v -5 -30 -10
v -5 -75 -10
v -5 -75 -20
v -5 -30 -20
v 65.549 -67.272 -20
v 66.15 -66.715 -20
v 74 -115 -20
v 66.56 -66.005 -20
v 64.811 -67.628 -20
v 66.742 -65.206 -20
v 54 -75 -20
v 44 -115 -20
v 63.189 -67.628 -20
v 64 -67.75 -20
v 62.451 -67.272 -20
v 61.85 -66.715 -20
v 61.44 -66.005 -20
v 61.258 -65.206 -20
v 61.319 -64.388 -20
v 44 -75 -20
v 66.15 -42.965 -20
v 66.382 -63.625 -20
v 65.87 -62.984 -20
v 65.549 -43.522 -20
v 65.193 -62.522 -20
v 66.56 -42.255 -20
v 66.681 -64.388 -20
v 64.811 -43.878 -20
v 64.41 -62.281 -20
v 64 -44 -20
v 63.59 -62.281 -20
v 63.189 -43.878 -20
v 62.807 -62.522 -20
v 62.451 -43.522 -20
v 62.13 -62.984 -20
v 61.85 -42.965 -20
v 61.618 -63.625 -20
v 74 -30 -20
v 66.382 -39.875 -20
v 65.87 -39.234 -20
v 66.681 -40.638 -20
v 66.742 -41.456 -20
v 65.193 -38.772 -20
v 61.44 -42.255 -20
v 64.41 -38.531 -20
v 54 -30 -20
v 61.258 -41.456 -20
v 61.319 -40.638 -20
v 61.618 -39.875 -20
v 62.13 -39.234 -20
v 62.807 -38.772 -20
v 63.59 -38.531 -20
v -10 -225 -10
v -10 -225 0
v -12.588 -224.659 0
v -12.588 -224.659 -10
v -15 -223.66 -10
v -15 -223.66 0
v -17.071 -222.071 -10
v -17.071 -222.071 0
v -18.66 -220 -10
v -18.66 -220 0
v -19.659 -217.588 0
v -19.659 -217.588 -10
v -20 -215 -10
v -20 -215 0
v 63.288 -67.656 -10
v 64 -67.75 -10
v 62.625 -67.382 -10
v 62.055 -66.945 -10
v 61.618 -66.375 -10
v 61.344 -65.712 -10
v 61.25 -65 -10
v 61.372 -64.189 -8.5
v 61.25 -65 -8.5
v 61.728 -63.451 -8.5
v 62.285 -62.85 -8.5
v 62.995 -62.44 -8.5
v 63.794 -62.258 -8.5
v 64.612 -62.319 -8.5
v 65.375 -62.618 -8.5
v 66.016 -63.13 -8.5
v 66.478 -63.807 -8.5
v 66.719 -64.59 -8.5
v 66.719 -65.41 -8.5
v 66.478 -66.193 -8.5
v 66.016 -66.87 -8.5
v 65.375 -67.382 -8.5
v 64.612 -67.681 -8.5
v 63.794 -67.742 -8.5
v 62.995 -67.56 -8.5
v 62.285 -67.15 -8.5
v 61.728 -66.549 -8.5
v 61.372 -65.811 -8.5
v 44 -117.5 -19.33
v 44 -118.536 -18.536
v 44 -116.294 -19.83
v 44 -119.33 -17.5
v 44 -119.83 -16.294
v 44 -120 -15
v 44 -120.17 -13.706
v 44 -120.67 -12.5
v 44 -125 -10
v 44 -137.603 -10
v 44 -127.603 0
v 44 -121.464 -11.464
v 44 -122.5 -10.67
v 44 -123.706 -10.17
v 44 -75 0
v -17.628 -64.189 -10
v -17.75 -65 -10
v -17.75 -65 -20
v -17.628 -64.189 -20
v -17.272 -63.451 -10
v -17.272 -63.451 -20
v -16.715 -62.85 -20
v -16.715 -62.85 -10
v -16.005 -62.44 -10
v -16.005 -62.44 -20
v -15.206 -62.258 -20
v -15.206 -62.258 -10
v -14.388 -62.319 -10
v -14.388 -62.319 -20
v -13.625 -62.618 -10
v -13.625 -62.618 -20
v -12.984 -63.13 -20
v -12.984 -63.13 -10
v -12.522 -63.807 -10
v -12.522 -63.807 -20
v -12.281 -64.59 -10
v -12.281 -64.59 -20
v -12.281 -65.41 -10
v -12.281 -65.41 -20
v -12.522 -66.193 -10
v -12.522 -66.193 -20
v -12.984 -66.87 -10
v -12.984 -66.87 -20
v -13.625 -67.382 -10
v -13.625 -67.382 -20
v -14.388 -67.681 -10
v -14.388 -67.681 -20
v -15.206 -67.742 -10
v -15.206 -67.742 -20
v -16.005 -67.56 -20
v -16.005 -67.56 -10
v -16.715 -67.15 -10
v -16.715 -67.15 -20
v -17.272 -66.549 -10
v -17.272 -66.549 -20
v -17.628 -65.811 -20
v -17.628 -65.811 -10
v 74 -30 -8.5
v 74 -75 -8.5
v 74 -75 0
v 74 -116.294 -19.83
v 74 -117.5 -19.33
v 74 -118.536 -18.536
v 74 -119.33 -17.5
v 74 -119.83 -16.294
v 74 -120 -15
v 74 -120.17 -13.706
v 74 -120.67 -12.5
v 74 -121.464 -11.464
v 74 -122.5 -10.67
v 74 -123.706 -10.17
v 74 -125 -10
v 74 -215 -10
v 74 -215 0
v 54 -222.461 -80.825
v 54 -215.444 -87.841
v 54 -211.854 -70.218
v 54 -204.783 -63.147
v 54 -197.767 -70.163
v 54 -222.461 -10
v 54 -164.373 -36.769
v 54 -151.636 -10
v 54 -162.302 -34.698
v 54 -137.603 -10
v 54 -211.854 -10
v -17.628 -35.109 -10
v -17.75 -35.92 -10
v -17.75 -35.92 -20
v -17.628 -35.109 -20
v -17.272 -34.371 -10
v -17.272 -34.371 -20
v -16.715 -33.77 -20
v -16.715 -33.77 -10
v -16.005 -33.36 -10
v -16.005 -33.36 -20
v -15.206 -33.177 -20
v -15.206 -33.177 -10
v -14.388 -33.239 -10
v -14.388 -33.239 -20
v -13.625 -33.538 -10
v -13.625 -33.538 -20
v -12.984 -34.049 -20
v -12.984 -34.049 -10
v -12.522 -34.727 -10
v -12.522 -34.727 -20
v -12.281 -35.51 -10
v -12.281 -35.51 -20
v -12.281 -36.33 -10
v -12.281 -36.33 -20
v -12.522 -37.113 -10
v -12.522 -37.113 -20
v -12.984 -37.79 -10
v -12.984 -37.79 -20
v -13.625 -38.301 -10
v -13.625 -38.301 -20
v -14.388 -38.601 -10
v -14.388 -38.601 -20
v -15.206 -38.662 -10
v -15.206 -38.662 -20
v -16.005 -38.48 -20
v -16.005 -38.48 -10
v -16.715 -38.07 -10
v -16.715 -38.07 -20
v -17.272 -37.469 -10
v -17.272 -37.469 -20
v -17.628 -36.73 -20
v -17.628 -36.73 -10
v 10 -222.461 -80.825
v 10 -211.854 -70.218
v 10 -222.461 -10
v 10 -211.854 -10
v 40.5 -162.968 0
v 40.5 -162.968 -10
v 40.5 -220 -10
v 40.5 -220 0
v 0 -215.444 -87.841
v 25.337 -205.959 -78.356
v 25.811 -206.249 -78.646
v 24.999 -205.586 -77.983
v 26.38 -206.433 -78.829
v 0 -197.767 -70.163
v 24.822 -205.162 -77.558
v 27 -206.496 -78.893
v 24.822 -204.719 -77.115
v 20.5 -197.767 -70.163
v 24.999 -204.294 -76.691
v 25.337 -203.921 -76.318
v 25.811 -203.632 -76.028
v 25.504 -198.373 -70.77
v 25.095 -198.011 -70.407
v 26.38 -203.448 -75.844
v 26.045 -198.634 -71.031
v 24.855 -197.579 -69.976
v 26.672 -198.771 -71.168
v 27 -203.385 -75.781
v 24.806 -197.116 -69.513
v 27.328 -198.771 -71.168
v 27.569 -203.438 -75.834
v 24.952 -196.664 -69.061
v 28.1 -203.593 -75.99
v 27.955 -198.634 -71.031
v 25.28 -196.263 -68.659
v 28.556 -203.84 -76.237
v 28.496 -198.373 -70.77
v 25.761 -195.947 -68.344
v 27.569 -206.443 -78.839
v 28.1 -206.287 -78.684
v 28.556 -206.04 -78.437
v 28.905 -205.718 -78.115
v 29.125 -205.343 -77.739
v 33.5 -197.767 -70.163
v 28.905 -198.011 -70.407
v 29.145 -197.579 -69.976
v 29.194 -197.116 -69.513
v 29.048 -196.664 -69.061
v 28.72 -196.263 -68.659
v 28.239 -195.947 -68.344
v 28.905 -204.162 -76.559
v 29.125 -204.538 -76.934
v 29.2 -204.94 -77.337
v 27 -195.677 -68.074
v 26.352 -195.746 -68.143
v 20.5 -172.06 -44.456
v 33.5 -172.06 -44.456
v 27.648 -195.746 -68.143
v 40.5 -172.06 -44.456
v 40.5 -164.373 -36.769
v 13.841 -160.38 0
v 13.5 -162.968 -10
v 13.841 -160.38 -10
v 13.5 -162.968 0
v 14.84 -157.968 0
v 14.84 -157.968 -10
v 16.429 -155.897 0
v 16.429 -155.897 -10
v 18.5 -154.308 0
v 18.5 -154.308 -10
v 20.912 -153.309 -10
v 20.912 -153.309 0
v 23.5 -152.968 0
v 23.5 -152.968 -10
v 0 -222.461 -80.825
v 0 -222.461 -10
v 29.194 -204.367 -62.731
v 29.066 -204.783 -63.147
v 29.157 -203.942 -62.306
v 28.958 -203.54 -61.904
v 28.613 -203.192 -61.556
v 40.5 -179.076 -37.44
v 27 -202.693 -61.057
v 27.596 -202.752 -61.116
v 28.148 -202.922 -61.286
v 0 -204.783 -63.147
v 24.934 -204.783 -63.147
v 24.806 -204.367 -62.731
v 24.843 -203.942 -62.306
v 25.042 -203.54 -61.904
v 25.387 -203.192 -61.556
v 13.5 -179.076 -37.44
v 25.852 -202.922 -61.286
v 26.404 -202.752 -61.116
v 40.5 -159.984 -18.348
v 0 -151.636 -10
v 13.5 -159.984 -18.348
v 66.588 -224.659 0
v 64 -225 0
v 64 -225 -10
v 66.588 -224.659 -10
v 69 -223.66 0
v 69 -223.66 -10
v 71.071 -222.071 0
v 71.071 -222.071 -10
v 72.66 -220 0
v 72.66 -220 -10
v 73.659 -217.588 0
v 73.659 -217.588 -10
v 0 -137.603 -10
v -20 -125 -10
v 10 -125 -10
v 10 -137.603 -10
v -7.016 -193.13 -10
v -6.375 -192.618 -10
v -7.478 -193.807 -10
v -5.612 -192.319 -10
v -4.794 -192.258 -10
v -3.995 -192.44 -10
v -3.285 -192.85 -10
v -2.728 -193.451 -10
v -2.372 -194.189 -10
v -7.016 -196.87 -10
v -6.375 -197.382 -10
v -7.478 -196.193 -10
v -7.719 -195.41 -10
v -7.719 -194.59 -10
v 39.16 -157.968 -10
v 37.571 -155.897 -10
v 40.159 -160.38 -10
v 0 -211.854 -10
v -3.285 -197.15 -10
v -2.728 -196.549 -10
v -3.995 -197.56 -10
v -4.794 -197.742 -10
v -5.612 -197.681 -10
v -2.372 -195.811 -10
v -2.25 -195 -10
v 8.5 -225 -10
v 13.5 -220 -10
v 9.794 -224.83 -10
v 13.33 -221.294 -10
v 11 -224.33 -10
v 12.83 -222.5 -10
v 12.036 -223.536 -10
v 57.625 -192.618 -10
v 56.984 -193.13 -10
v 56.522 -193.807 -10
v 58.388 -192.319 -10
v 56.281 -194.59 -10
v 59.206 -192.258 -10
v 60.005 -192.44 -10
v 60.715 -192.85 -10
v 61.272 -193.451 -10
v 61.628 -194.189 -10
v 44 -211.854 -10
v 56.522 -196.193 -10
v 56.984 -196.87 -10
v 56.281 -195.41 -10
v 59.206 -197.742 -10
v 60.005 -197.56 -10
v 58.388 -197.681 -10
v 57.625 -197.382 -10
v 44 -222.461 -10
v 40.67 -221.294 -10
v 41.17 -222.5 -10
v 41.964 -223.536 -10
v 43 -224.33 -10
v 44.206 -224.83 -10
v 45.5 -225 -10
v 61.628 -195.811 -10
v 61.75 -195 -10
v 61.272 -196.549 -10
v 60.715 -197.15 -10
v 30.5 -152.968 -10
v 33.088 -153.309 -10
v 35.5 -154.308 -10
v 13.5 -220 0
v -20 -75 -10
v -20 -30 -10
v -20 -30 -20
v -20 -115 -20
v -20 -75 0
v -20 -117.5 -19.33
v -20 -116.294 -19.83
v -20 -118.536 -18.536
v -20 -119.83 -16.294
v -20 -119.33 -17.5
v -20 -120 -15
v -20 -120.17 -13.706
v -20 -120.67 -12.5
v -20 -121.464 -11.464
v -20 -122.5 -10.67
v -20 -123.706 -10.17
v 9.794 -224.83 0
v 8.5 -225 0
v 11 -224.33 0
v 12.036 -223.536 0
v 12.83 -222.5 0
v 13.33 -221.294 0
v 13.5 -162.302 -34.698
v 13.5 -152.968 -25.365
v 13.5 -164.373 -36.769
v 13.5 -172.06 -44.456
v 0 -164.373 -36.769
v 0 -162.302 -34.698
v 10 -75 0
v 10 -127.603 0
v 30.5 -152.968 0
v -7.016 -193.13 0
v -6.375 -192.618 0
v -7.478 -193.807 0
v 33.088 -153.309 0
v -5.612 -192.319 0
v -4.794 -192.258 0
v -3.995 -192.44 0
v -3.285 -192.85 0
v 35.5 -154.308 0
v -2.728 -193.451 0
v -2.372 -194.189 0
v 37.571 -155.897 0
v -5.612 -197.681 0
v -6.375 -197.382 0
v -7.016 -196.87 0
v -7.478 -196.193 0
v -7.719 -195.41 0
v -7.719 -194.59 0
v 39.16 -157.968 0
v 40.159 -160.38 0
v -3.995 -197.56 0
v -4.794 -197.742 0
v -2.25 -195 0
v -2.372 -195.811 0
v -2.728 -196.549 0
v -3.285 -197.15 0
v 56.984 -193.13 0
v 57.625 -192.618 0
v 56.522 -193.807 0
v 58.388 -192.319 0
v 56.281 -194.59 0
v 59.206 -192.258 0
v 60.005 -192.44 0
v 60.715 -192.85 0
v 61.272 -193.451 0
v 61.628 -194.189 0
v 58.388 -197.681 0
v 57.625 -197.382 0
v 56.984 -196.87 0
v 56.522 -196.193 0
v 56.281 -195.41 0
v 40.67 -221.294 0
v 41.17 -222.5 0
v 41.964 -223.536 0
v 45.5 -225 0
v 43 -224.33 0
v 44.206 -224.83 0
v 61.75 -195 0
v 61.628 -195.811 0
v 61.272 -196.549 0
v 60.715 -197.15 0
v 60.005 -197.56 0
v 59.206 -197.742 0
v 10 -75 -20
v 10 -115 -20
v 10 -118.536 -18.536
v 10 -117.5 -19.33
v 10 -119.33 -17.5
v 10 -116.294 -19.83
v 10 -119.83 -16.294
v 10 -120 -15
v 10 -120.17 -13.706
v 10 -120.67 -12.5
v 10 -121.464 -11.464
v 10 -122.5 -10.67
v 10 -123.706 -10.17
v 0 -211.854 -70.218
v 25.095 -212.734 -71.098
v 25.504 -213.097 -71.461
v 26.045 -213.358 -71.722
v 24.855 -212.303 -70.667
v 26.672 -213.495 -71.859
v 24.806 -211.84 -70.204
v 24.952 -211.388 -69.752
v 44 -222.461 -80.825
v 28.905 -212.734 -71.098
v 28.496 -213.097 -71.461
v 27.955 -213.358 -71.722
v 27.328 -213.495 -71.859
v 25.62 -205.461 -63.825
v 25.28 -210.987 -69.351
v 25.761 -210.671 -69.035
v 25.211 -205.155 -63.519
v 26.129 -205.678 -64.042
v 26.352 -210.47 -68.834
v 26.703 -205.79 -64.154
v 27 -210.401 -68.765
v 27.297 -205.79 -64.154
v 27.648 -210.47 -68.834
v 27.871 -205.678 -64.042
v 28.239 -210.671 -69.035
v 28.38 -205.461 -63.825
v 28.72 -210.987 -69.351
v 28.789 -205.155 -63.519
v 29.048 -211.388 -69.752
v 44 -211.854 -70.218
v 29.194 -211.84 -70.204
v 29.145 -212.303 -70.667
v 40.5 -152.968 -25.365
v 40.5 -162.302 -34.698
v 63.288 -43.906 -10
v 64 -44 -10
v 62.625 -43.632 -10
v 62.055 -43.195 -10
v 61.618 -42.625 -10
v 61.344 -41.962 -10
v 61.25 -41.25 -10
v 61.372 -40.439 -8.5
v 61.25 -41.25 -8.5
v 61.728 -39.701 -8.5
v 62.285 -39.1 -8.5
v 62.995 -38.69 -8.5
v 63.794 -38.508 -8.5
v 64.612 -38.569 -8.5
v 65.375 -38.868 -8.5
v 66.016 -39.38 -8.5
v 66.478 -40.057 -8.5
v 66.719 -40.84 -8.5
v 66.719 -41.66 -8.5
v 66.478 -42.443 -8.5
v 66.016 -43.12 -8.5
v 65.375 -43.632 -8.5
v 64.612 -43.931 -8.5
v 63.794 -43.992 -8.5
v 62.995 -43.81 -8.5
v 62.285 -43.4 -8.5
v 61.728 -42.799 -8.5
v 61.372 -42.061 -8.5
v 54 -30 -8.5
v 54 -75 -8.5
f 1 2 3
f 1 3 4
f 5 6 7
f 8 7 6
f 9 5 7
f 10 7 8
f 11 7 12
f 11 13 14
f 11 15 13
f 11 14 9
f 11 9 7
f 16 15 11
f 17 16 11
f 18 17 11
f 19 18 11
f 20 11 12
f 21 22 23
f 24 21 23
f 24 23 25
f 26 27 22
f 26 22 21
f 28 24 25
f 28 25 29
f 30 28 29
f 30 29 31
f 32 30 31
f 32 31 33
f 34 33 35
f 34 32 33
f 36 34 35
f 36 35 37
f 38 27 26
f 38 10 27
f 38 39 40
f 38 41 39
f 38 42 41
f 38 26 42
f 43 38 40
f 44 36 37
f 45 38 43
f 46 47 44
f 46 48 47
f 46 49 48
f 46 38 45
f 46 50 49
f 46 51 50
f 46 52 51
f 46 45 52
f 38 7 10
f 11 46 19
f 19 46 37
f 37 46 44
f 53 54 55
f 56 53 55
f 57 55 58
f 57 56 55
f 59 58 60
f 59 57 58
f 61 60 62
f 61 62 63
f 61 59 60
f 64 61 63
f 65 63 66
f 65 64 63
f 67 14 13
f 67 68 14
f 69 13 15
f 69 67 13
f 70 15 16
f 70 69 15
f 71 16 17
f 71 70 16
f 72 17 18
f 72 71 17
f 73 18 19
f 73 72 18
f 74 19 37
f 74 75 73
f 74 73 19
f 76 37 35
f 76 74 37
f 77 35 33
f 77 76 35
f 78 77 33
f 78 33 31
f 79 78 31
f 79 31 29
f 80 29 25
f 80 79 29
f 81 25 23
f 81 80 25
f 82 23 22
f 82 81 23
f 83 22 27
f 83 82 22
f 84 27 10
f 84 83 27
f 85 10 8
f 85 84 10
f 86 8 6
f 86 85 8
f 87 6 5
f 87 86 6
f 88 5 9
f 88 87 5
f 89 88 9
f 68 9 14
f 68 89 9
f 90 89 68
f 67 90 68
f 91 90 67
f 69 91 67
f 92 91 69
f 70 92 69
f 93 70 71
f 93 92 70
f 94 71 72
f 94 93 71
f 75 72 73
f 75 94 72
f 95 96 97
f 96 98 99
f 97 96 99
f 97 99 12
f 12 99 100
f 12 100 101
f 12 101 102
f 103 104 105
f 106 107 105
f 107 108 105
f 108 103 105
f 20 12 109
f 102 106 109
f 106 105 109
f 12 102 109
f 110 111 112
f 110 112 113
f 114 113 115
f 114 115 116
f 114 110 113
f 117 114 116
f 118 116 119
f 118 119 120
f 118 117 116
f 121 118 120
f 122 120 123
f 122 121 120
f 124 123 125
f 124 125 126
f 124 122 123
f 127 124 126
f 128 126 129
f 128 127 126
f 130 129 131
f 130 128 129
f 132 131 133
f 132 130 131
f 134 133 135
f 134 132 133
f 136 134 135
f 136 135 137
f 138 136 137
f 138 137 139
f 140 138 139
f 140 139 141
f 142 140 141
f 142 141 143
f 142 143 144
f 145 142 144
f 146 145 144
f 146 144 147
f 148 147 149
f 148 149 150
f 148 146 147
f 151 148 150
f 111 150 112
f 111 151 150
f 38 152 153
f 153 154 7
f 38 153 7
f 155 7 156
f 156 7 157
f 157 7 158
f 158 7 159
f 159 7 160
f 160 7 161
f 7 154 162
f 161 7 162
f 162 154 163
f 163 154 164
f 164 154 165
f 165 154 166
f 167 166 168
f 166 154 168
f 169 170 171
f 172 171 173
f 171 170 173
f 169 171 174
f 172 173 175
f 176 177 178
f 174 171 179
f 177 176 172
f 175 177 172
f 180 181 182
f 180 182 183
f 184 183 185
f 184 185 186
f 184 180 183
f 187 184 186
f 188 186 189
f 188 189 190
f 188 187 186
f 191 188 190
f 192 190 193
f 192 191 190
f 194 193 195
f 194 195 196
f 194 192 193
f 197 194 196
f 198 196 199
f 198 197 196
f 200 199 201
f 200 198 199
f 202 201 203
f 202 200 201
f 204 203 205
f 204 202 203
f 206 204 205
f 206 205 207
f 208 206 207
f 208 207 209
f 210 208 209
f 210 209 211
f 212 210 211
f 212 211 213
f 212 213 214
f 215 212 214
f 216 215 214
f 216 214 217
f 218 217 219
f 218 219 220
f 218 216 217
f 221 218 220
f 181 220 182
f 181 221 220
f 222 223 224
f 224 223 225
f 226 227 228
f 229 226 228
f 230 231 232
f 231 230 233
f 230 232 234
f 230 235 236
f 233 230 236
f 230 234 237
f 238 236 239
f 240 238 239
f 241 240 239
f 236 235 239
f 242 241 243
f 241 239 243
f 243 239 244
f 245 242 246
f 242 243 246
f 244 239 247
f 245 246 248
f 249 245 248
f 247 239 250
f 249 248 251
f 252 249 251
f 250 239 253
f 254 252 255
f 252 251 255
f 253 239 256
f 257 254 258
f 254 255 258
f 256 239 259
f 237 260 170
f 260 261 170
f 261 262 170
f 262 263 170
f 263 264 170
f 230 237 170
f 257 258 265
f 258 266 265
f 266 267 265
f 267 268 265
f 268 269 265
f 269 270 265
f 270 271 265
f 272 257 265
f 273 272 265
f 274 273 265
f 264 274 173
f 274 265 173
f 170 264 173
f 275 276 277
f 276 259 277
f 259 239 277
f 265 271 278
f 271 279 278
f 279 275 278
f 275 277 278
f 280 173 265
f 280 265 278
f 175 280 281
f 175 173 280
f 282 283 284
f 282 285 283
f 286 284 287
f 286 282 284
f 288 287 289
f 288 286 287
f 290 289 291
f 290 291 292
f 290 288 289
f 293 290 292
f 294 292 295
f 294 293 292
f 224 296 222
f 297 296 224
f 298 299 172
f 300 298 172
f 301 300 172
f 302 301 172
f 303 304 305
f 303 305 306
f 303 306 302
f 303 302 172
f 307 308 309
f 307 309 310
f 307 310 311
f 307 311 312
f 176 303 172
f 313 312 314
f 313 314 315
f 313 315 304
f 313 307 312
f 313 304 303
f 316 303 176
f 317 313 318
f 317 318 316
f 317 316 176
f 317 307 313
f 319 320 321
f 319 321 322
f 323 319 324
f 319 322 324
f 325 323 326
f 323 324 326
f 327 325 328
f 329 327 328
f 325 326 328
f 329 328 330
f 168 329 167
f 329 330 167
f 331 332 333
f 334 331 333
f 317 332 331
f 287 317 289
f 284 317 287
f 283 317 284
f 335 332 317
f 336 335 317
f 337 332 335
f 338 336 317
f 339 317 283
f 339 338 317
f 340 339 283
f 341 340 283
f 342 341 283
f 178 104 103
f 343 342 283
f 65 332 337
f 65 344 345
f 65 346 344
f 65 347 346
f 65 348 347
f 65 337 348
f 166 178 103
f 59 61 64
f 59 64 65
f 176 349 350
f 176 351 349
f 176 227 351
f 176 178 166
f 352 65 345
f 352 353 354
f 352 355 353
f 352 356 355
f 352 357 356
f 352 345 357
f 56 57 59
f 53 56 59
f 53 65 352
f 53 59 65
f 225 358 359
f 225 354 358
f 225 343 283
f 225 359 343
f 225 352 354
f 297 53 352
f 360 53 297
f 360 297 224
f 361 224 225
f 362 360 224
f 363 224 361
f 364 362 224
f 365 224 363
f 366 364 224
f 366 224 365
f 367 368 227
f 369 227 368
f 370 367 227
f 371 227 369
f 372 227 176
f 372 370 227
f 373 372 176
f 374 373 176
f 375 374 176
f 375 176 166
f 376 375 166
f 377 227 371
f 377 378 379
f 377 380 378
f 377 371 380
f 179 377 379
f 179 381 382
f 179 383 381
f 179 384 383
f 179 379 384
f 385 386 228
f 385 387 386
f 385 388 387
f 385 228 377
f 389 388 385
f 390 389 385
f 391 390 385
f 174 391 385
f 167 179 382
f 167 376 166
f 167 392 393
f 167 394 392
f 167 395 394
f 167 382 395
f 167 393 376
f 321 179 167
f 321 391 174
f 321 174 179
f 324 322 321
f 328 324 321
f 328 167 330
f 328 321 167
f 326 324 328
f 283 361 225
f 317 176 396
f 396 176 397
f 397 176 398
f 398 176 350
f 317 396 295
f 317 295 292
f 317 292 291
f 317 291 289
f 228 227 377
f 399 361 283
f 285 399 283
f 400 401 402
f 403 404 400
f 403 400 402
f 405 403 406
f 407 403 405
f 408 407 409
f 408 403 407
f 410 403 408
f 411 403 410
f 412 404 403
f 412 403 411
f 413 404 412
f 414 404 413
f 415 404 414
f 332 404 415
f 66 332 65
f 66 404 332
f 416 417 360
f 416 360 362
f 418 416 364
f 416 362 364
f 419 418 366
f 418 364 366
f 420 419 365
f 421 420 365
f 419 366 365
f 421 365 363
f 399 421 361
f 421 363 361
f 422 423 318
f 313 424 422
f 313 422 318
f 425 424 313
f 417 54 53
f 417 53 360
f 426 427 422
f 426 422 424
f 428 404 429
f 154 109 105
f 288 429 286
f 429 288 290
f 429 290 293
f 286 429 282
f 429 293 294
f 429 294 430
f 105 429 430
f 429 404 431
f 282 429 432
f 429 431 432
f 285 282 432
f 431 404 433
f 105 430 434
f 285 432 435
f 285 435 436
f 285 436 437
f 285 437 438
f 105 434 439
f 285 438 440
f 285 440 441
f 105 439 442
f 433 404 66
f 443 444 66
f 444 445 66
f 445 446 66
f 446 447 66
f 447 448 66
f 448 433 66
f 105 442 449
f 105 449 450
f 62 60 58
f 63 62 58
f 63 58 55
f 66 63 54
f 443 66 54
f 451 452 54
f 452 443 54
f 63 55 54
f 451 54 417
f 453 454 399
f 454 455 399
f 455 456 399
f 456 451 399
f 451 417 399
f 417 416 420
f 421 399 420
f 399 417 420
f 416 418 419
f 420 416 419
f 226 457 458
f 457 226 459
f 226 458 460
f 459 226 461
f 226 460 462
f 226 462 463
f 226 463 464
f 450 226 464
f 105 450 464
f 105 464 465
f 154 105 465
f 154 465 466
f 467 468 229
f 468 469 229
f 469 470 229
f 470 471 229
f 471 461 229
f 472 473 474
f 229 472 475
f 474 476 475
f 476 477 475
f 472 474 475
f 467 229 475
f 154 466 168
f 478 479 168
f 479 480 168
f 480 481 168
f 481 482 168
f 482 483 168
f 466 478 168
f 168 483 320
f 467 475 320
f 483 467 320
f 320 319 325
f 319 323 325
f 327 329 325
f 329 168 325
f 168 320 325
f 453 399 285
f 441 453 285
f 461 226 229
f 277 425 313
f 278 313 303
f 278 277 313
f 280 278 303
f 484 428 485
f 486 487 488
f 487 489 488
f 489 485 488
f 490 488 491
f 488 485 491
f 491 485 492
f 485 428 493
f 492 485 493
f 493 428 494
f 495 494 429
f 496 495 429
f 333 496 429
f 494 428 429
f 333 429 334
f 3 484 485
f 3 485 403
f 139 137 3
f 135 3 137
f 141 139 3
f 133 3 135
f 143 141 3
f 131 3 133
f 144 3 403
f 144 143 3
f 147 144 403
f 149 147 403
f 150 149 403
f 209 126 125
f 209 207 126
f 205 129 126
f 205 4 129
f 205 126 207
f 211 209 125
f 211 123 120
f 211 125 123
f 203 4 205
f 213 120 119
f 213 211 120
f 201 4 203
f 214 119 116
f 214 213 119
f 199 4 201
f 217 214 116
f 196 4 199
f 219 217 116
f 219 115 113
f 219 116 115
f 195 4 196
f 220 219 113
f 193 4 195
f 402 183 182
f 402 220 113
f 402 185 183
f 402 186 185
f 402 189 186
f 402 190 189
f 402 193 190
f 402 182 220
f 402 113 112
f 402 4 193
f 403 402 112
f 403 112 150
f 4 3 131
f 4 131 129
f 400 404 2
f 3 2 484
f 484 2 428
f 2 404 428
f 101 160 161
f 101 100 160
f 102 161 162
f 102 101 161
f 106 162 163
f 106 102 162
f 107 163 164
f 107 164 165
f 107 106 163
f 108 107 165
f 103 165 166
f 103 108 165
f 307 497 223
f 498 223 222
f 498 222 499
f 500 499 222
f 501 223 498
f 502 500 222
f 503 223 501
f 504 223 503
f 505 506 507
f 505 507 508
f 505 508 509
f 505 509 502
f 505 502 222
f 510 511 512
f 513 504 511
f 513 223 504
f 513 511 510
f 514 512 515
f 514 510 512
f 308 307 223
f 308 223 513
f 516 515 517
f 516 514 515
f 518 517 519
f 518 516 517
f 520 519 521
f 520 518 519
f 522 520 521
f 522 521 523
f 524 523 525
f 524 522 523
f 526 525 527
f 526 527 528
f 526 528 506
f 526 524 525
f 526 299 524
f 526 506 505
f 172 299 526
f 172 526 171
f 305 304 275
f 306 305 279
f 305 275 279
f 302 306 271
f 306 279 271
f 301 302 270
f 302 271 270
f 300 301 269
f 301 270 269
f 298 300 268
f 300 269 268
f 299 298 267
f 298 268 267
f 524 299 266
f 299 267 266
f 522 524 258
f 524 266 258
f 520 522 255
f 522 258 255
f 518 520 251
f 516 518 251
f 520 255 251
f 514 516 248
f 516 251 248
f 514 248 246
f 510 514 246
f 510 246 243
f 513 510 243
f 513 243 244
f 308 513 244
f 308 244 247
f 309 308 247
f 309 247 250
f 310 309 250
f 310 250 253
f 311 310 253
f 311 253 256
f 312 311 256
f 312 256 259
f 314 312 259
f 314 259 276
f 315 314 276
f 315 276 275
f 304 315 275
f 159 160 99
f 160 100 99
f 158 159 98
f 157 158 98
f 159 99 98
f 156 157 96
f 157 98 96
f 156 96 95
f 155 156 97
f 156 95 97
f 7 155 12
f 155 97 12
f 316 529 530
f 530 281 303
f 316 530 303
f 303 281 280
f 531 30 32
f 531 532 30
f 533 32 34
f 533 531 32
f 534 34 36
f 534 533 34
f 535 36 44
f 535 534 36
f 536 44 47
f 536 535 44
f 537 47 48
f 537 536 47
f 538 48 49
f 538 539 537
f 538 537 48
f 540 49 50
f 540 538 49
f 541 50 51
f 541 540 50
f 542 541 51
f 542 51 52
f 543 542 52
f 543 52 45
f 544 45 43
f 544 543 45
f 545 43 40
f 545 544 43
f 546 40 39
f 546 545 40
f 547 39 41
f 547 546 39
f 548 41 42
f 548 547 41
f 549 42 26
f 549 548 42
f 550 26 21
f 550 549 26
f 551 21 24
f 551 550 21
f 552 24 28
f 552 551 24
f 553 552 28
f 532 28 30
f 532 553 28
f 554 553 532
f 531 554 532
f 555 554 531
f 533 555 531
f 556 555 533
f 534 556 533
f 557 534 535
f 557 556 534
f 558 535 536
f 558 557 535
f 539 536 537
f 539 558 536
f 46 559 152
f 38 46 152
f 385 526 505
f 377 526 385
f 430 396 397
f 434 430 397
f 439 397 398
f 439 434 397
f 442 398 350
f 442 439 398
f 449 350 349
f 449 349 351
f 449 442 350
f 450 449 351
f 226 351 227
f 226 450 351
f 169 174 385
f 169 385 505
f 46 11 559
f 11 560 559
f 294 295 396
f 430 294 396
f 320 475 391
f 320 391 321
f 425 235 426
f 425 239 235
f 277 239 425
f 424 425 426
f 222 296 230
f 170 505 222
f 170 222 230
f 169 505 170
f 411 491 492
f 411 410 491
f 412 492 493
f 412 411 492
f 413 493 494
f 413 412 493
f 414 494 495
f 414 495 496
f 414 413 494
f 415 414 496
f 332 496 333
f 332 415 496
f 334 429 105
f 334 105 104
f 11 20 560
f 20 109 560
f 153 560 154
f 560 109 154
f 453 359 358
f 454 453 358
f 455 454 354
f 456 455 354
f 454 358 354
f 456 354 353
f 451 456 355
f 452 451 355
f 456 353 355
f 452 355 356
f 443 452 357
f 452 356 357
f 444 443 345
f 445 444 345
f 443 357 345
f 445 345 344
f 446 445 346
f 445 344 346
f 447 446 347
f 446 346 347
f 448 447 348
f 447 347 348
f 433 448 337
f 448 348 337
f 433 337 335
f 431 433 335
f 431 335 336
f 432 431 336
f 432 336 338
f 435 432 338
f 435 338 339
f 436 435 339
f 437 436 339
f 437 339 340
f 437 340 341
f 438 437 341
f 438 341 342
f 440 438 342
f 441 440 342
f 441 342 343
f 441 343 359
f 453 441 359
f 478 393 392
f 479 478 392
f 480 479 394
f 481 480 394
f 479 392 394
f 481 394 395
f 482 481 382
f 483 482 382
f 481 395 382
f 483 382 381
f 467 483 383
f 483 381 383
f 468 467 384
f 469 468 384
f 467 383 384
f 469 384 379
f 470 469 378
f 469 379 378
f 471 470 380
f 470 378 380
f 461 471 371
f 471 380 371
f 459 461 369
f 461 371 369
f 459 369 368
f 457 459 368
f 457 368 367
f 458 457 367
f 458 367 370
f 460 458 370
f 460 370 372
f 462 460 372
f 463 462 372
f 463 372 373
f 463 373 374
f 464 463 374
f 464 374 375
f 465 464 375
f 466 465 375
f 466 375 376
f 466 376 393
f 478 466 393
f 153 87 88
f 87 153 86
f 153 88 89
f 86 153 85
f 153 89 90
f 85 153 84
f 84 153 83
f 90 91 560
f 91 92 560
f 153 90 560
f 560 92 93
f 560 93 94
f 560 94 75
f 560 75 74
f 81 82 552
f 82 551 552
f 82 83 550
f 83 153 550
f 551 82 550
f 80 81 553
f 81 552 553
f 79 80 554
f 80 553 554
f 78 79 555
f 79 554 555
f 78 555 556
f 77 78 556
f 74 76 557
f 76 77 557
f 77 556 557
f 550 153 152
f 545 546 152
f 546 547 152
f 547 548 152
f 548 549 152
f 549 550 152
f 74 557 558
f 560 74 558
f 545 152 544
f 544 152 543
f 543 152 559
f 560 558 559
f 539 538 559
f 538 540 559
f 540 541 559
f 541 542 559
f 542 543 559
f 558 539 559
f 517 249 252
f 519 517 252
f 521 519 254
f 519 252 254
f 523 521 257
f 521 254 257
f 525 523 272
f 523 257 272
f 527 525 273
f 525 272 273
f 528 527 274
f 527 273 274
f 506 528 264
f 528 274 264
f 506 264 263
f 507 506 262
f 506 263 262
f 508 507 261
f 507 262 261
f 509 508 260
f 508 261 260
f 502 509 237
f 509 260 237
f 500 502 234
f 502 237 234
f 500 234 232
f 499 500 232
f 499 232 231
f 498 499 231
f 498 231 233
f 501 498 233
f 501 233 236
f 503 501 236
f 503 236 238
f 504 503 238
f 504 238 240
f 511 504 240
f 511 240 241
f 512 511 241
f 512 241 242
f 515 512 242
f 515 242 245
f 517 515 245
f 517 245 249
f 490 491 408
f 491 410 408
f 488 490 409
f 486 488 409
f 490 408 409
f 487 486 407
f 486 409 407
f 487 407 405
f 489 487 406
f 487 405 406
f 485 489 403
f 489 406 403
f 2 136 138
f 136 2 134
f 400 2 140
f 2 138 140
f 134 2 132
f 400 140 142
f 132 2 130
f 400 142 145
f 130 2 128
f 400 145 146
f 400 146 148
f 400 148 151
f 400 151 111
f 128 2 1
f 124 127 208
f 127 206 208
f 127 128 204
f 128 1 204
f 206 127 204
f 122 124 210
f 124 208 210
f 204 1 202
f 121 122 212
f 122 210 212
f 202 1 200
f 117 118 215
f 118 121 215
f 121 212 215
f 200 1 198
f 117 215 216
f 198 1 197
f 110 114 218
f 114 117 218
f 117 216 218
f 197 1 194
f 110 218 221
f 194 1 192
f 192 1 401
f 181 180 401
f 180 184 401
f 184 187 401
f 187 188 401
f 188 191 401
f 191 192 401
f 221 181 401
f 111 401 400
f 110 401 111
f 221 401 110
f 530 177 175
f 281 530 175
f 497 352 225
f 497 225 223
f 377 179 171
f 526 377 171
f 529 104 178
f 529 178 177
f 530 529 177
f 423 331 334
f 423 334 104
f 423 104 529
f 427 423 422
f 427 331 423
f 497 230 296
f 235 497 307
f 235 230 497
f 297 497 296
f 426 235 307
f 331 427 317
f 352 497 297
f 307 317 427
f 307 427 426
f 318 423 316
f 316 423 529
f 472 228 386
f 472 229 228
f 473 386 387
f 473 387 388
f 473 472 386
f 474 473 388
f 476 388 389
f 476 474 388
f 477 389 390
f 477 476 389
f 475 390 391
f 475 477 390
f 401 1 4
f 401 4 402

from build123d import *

# Parameters (mm, degrees)
SKETCH2_W               = 34
SKETCH2_H               = 20
SKETCH2_W_2             = 30
SKETCH2_H_2             = 150
BOSS_EXTRUDE1_DEPTH     = 10
SKETCH3_W               = 20
SKETCH3_H               = 45
SKETCH3_R               = 2.75
BOSS_EXTRUDE2_DEPTH     = 1.5
SKETCH4_W               = 15
SKETCH4_H               = 45
SKETCH4_R               = 2.75
BOSS_EXTRUDE3_DEPTH     = 10
SKETCH5_R               = 2.75
BOSS_EXTRUDE4_DEPTH     = 10
FILLET1_R               = 5
SKETCH6_W               = 34
SKETCH6_H               = 10
BOSS_EXTRUDE5_DEPTH     = 70
BOSS_EXTRUDE6_REACH     = 246.665
CUT_EXTRUDE1_DEPTH      = 34
FILLET2_R               = 5
CUT_EXTRUDE2_START      = -20
CUT_EXTRUDE2_DEPTH      = 20
CUT_EXTRUDE3_DEPTH      = 20
BOSS_EXTRUDE7_DEPTH     = 54
CUT_EXTRUDE4_DEPTH      = 240.922546822
CUT_EXTRUDE4_DEPTH_BACK = 240.922546822
CUT_EXTRUDE5_DEPTH      = 240.922546822
CUT_EXTRUDE5_DEPTH_BACK = 240.922546822
BOSS_EXTRUDE8_DEPTH     = 54
CUT_EXTRUDE6_DEPTH      = 248.030112784
CUT_EXTRUDE6_DEPTH_BACK = 248.030112784
SKETCH18_R              = 2.2
CUT_EXTRUDE7_DEPTH      = 9.92254106
SKETCH20_W              = 54
SKETCH20_H              = 9.922541059
BOSS_EXTRUDE9_DEPTH     = 25
SKETCH21_R              = 2.2
CUT_EXTRUDE8_DEPTH      = 25
BOSS_EXTRUDE10_START    = 13
SKETCH22_R              = 2.2
BOSS_EXTRUDE10_DEPTH    = 13
SKETCH23_W              = 13
SKETCH23_H              = 77.7
CUT_EXTRUDE10_DEPTH     = 13
SKETCH24_W              = 27
SKETCH24_H              = 27
CUT_EXTRUDE11_DEPTH     = 10
CUT_EXTRUDE12_DEPTH     = 10
BOSS_EXTRUDE11_DEPTH    = 10
BOSS_EXTRUDE12_DEPTH    = 10
FILLET3_R               = 10
FILLET4_R               = 5
FILLET5_R               = 10
CUT_EXTRUDE14_DEPTH     = 250.319480135


with BuildPart() as part:
    # Sketch2 → Boss-Extrude1 (new body)
    with BuildSketch(Plane.XY):
        Polygon((10, -225), (10, -205), (10, -75), (-20, -75), (-20, -225), align=None)
        with Locations((27, -215)):
            Rectangle(SKETCH2_W, SKETCH2_H)
        with Locations((59, -150)):
            Rectangle(SKETCH2_W_2, SKETCH2_H_2)
    extrude(amount=-BOSS_EXTRUDE1_DEPTH)

    # Sketch3 → Boss-Extrude2 (add)
    with BuildSketch(Plane(origin=(0, 0, -8.5), x_dir=(-1, 0, 0), z_dir=(0, 0, -1))):
        with Locations((-64, -52.5)):
            Rectangle(SKETCH3_W, SKETCH3_H)
        with Locations((-64, -65)):
            Circle(SKETCH3_R, mode=Mode.SUBTRACT)
        with Locations((-64, -41.25)):
            Circle(SKETCH3_R, mode=Mode.SUBTRACT)
    extrude(amount=BOSS_EXTRUDE2_DEPTH)

    # Sketch4 → Boss-Extrude3 (add)
    # profile 1 of 2: a face of its own
    with BuildSketch(Plane(origin=(0, 0, -10), x_dir=(-1, 0, 0), z_dir=(0, 0, -1))):
        Polygon((20, -75), (5, -75), (-10, -75), (-10, -120), (20, -120), align=None)
    # profile 2 of 2: a face of its own
    with BuildSketch(Plane(origin=(0, 0, -10), x_dir=(-1, 0, 0), z_dir=(0, 0, -1))):
        with Locations((12.5, -52.5)):
            Rectangle(SKETCH4_W, SKETCH4_H)
        with Locations((15, -65)):
            Circle(SKETCH4_R, mode=Mode.SUBTRACT)
        with Locations((15, -35.919713403)):
            Circle(SKETCH4_R, mode=Mode.SUBTRACT)
    extrude(amount=BOSS_EXTRUDE3_DEPTH)

    # Sketch5 → Boss-Extrude4 (add)
    with BuildSketch(Plane(origin=(0, 0, -10), x_dir=(-1, 0, 0), z_dir=(0, 0, -1))):
        Polygon((-74, -120), (-44, -120), (-44, -75), (-54, -75), (-54, -30), (-74, -30), align=None)
        with Locations(Location((-64, -65, 0), (0, 0, 270))):
            Circle(SKETCH5_R, mode=Mode.SUBTRACT)
        with Locations(Location((-64, -41.25, 0), (0, 0, 270))):
            Circle(SKETCH5_R, mode=Mode.SUBTRACT)
    extrude(amount=BOSS_EXTRUDE4_DEPTH)

    # Fillet1
    fillet1_edges = [part.edges().sort_by_distance(p)[0] for p in [
        (59, -120, -10),
        (-5, -120, -10),
    ]]
    fillet(fillet1_edges, radius=FILLET1_R)
    fillet1_2_edges = [part.edges().sort_by_distance(p)[0] for p in [
        (59, -120, -20),
        (-5, -120, -20),
    ]]
    fillet(fillet1_2_edges, radius=FILLET1_R - 0.0001)  # a hair under: the kernel refuses the full size

    # Sketch6 → Boss-Extrude5 (add)
    with BuildSketch(Plane(origin=(0, -205, 0), x_dir=(1, 0, 0), z_dir=(0, 1, 0))):
        with Locations((27, 5)):
            Rectangle(SKETCH6_W, SKETCH6_H)
    extrude(amount=BOSS_EXTRUDE5_DEPTH)

    # Boss-Extrude6: up to this face of the body (flat: up to its plane)
    boss_extrude6_end = Plane(part.part.faces().sort_by_distance((74, -119.982060157, -8.746792457))[0])
    # Sketch7 → Boss-Extrude6 (add, up to the picked face)
    with BuildSketch(Plane.ZY.offset(20), mode=Mode.PRIVATE) as boss_extrude6_sk1:
        Polygon((-10, -137.603336753), (-34.698331624, -162.301668376), (-45.304933341, -172.908270094), (-10, -172.908270094), align=None)
    boss_extrude6_tool1 = split(extrude(boss_extrude6_sk1.sketch, amount=-BOSS_EXTRUDE6_REACH, mode=Mode.PRIVATE), bisect_by=boss_extrude6_end, keep=Keep.BOTH, mode=Mode.PRIVATE)
    # Sketch7 → Boss-Extrude6 (add, up to the picked face)
    with BuildSketch(Plane.ZY.offset(20), mode=Mode.PRIVATE) as boss_extrude6_sk2:
        Polygon((0, -127.603336753), (-10, -137.603336753), (-10, -172.908270094), (0, -172.908270094), align=None)
    boss_extrude6_tool2 = split(extrude(boss_extrude6_sk2.sketch, amount=-BOSS_EXTRUDE6_REACH, mode=Mode.PRIVATE), bisect_by=boss_extrude6_end, keep=Keep.BOTH, mode=Mode.PRIVATE)
    add(boss_extrude6_tool1.solids().sort_by(Axis((-20, -161.139959, -21.768311), (1, 0, 0)))[0])
    add(boss_extrude6_tool2.solids().sort_by(Axis((-20, -152.652425, -4.793243), (1, 0, 0)))[0])

    # Sketch8 → Cut-Extrude1 (cut)
    with BuildSketch(Plane.ZY.offset(-44)):
        Polygon((-7.396663247, -135), (-10.086941063, -137.690277816), (-10, -135), align=None)
    extrude(amount=CUT_EXTRUDE1_DEPTH, mode=Mode.SUBTRACT)

    # Fillet2
    fillet2_edges = [part.edges().sort_by_distance(p)[0] for p in [
        (27, -172.908270094, -45.304933341),
    ]]
    fillet(fillet2_edges, radius=FILLET2_R)

    # Sketch9 → Cut-Extrude2 (cut)
    with BuildSketch(Plane.ZY.offset(20).offset(CUT_EXTRUDE2_START)):
        with BuildLine():
            Line((-10, -172.908270094), (-10, -137.603336753))
            Line((-10, -137.603336753), (-36.769399436, -164.372736188))
            ThreePointArc((-36.769399436, -164.372736188), (-37.853263192, -169.821687256), (-33.23386553, -172.908270094))
            Line((-33.23386553, -172.908270094), (-10, -172.908270094))
        make_face()
    extrude(amount=CUT_EXTRUDE2_DEPTH, mode=Mode.SUBTRACT)

    # Sketch10 → Cut-Extrude3 (cut)
    with BuildSketch(Plane(origin=(74, 0, 0), x_dir=(0, 0, -1), z_dir=(1, 0, 0))):
        with BuildLine():
            Line((10, -137.603336753), (10, -172.908270094))
            Line((10, -172.908270094), (33.23386553, -172.908270094))
            ThreePointArc((33.23386553, -172.908270094), (37.853263192, -169.821687256), (36.769399436, -164.372736188))
            Line((36.769399436, -164.372736188), (10, -137.603336753))
        make_face()
    extrude(amount=-CUT_EXTRUDE3_DEPTH, mode=Mode.SUBTRACT)

    # Sketch12 → Boss-Extrude7 (add)
    with BuildSketch(Plane.ZY):
        Polygon((-10, -137.603336753), (22.716423027, -106.706157847), (36.44850254, -121.246790303), (-10, -165.112456538), align=None)
    extrude(amount=-BOSS_EXTRUDE7_DEPTH)

    # Sketch13 → Cut-Extrude4 (cut, two sides: drawn at the far end of the back side and taken through both)
    with BuildSketch(Plane(origin=(54, 0, 0), x_dir=(0, 0, -1), z_dir=(1, 0, 0)).offset(-CUT_EXTRUDE4_DEPTH_BACK)):
        Polygon((17.239749062, -172.908270094), (10, -165.668521032), (10, -172.908270094), align=None)
    extrude(amount=CUT_EXTRUDE4_DEPTH + CUT_EXTRUDE4_DEPTH_BACK, mode=Mode.SUBTRACT)

    # Sketch14 → Cut-Extrude5 (cut, two sides: drawn at the far end of the back side and taken through both)
    with BuildSketch(Plane(origin=(54, 0, 0), x_dir=(0, 0, -1), z_dir=(1, 0, 0)).offset(-CUT_EXTRUDE5_DEPTH_BACK)):
        Polygon((-36.44850254, -121.246790303), (0, -155.668521032), (0, -128.159401246), (-22.716423027, -106.706157847), align=None)
    extrude(amount=CUT_EXTRUDE5_DEPTH + CUT_EXTRUDE5_DEPTH_BACK, mode=Mode.SUBTRACT)

    # Sketch15 → Boss-Extrude8 (add)
    with BuildSketch(Plane(origin=(54, 0, 0), x_dir=(0, 0, -1), z_dir=(1, 0, 0))):
        with BuildLine():
            Line((17.239749062, -172.908270094), (56.130622027, -211.799143059))
            Line((56.130622027, -211.799143059), (70.163214167, -197.76655092))
            Line((70.163214167, -197.76655092), (36.769399436, -164.372736188))
            ThreePointArc((36.769399436, -164.372736188), (37.853263192, -169.821687256), (33.23386553, -172.908270094))
            Line((33.23386553, -172.908270094), (17.239749062, -172.908270094))
        make_face()
    extrude(amount=-BOSS_EXTRUDE8_DEPTH)

    # Sketch16 → Cut-Extrude6 (cut, two sides: drawn at the far end of the back side and taken through both)
    with BuildSketch(Plane(origin=(54, 0, 0), x_dir=(0, 0, -1), z_dir=(1, 0, 0)).offset(-CUT_EXTRUDE6_DEPTH_BACK)):
        Polygon((63.146918097, -204.78284699), (10, -151.635928892), (10, -165.668521032), (56.130622027, -211.799143059), align=None)
    extrude(amount=CUT_EXTRUDE6_DEPTH + CUT_EXTRUDE6_DEPTH_BACK, mode=Mode.SUBTRACT)

    # Sketch18 → Cut-Extrude7 (cut)
    with BuildSketch(Plane(origin=(0, -63.801668376, 63.801668376), x_dir=(1, 0, 0), z_dir=(0, 0.707106781186546, -0.7071067811865491))):
        with Locations(Location((27, 144.300035894, 0), (0, 0, 270))):
            Circle(SKETCH18_R)
        with Locations(Location((27, 134.300035894, 0), (0, 0, 270))):
            Circle(SKETCH18_R)
    extrude(amount=-CUT_EXTRUDE7_DEPTH, mode=Mode.SUBTRACT)

    # Sketch20 → Boss-Extrude9 (add)
    with BuildSketch(Plane(origin=(0, -133.964882543, -133.964882543), x_dir=(1, 0, 0), z_dir=(0, -0.707106781186548, -0.7071067811865471))):
        with Locations((27, 95.19045525)):
            Rectangle(SKETCH20_W, SKETCH20_H)
    extrude(amount=BOSS_EXTRUDE9_DEPTH)

    # Sketch21 → Cut-Extrude8 (cut)
    with BuildSketch(Plane(origin=(0, -63.801668376, 63.801668376), x_dir=(1, 0, 0), z_dir=(0, 0.707106781186546, -0.7071067811865491))):
        with Locations(Location((27, 199.600035894, 0), (0, 0, 270))):
            Circle(SKETCH21_R)
        with Locations(Location((27, 188.700035894, 0), (0, 0, 270))):
            Circle(SKETCH21_R)
    extrude(amount=-CUT_EXTRUDE8_DEPTH, mode=Mode.SUBTRACT)

    # Sketch22 → Boss-Extrude10 (add)
    with BuildSketch(Plane(origin=(0, -63.801668376, 63.801668376), x_dir=(1, 0, 0), z_dir=(0, 0.707106781186546, -0.7071067811865491)).offset(BOSS_EXTRUDE10_START)):
        Polygon((33.5, 205.800035894), (27, 205.800035894), (20.5, 205.800035894), (20.5, 128.100035894), (27, 128.100035894), (33.5, 128.100035894), align=None)
        with BuildLine():
            ThreePointArc((29.2, 134.300035894), (28.555634919, 132.744400975), (27, 132.100035894))
            ThreePointArc((27, 132.100035894), (25.444365081, 135.855670812), (29.2, 134.300035894))
        make_face(mode=Mode.SUBTRACT)
        with Locations((27, 144.300035894)):
            Circle(SKETCH22_R, mode=Mode.SUBTRACT)
        with Locations((27, 188.700035894)):
            Circle(SKETCH22_R, mode=Mode.SUBTRACT)
        with BuildLine():
            ThreePointArc((29.2, 199.600035894), (25.444365081, 198.044400975), (27, 201.800035894))
            ThreePointArc((27, 201.800035894), (28.555634919, 201.155670812), (29.2, 199.600035894))
        make_face(mode=Mode.SUBTRACT)
    extrude(amount=-BOSS_EXTRUDE10_DEPTH)

    # Sketch23 → Cut-Extrude10 (cut)
    with BuildSketch(Plane(origin=(0, -54.609280221, 54.609280221), x_dir=(1, 0, 0), z_dir=(0, 0.707106781186546, -0.707106781186549))):
        with Locations((27, 166.950035894)):
            Rectangle(SKETCH23_W, SKETCH23_H)
    extrude(amount=-CUT_EXTRUDE10_DEPTH, mode=Mode.SUBTRACT)

    # Sketch24 → Cut-Extrude11 (cut)
    with BuildSketch(Plane(origin=(0, -63.801668376, 63.801668376), x_dir=(1, 0, 0), z_dir=(0, 0.707106781186546, -0.7071067811865491))):
        with Locations((27, 139.600035894)):
            Rectangle(SKETCH24_W, SKETCH24_H)
    extrude(amount=-CUT_EXTRUDE11_DEPTH, mode=Mode.SUBTRACT)

    # Sketch25 → Cut-Extrude12 (cut)
    with BuildSketch(Plane(origin=(0, 0, -10), x_dir=(-1, 0, 0), z_dir=(0, 0, -1))):
        Polygon((-40.5, -152.967858865), (-40.5, -233.312040373), (-13.5, -234.023370682), (-13.5, -152.967858865), align=None)
    extrude(amount=-CUT_EXTRUDE12_DEPTH, mode=Mode.SUBTRACT)

    # Sketch26 → Boss-Extrude11 (add)
    with BuildSketch(Plane(origin=(54, 0, 0), x_dir=(0, 0, -1), z_dir=(1, 0, 0))):
        Polygon((80.824587627, -222.460516519), (6.638247164, -222.460516519), (3.697137503, -222.460516519), (3.697137503, -211.853914801), (70.217985909, -211.853914801), align=None)
    extrude(amount=-BOSS_EXTRUDE11_DEPTH)

    # Sketch27 → Boss-Extrude12 (add)
    with BuildSketch(Plane.ZY):
        Polygon((-10, -222.460516519), (-10, -211.853914801), (-70.217985909, -211.853914801), (-80.824587627, -222.460516519), align=None)
    extrude(amount=-BOSS_EXTRUDE12_DEPTH)

    # Fillet3
    fillet3_edges = [part.edges().sort_by_distance(p)[0] for p in [
        (-20, -225, -5),
        (74, -225, -5),
    ]]
    fillet(fillet3_edges, radius=FILLET3_R)

    # Fillet4
    fillet4_edges = [part.edges().sort_by_distance(p)[0] for p in [
        (13.5, -225, -5),
        (40.5, -225, -5),
    ]]
    fillet(fillet4_edges, radius=FILLET4_R)

    # Fillet5
    fillet5_edges = [part.edges().sort_by_distance(p)[0] for p in [
        (13.5, -152.967858865, -5),
        (40.5, -152.967858865, -5),
    ]]
    fillet(fillet5_edges, radius=FILLET5_R)

    # Sketch28 → Cut-Extrude14 (cut, through all)
    with BuildSketch(Plane(origin=(0, 0, -10), x_dir=(-1, 0, 0), z_dir=(0, 0, -1))):
        with BuildLine():
            Line((-61.75, -195), (-59, -195))
            Line((-59, -195), (-56.25, -195))
            ThreePointArc((-56.25, -195), (-59, -192.25), (-61.75, -195))
        make_face()
        with BuildLine():
            Line((-56.25, -195), (-59, -195))
            Line((-59, -195), (-61.75, -195))
            ThreePointArc((-61.75, -195), (-59, -197.75), (-56.25, -195))
        make_face()
        with BuildLine():
            ThreePointArc((7.75, -195), (5, -192.25), (2.25, -195))
            Line((2.25, -195), (5, -195))
            Line((5, -195), (7.75, -195))
        make_face()
        with BuildLine():
            Line((5, -195), (2.25, -195))
            ThreePointArc((2.25, -195), (5, -197.75), (7.75, -195))
            Line((7.75, -195), (5, -195))
        make_face()
    extrude(amount=-CUT_EXTRUDE14_DEPTH, mode=Mode.SUBTRACT)


solid = part.part
